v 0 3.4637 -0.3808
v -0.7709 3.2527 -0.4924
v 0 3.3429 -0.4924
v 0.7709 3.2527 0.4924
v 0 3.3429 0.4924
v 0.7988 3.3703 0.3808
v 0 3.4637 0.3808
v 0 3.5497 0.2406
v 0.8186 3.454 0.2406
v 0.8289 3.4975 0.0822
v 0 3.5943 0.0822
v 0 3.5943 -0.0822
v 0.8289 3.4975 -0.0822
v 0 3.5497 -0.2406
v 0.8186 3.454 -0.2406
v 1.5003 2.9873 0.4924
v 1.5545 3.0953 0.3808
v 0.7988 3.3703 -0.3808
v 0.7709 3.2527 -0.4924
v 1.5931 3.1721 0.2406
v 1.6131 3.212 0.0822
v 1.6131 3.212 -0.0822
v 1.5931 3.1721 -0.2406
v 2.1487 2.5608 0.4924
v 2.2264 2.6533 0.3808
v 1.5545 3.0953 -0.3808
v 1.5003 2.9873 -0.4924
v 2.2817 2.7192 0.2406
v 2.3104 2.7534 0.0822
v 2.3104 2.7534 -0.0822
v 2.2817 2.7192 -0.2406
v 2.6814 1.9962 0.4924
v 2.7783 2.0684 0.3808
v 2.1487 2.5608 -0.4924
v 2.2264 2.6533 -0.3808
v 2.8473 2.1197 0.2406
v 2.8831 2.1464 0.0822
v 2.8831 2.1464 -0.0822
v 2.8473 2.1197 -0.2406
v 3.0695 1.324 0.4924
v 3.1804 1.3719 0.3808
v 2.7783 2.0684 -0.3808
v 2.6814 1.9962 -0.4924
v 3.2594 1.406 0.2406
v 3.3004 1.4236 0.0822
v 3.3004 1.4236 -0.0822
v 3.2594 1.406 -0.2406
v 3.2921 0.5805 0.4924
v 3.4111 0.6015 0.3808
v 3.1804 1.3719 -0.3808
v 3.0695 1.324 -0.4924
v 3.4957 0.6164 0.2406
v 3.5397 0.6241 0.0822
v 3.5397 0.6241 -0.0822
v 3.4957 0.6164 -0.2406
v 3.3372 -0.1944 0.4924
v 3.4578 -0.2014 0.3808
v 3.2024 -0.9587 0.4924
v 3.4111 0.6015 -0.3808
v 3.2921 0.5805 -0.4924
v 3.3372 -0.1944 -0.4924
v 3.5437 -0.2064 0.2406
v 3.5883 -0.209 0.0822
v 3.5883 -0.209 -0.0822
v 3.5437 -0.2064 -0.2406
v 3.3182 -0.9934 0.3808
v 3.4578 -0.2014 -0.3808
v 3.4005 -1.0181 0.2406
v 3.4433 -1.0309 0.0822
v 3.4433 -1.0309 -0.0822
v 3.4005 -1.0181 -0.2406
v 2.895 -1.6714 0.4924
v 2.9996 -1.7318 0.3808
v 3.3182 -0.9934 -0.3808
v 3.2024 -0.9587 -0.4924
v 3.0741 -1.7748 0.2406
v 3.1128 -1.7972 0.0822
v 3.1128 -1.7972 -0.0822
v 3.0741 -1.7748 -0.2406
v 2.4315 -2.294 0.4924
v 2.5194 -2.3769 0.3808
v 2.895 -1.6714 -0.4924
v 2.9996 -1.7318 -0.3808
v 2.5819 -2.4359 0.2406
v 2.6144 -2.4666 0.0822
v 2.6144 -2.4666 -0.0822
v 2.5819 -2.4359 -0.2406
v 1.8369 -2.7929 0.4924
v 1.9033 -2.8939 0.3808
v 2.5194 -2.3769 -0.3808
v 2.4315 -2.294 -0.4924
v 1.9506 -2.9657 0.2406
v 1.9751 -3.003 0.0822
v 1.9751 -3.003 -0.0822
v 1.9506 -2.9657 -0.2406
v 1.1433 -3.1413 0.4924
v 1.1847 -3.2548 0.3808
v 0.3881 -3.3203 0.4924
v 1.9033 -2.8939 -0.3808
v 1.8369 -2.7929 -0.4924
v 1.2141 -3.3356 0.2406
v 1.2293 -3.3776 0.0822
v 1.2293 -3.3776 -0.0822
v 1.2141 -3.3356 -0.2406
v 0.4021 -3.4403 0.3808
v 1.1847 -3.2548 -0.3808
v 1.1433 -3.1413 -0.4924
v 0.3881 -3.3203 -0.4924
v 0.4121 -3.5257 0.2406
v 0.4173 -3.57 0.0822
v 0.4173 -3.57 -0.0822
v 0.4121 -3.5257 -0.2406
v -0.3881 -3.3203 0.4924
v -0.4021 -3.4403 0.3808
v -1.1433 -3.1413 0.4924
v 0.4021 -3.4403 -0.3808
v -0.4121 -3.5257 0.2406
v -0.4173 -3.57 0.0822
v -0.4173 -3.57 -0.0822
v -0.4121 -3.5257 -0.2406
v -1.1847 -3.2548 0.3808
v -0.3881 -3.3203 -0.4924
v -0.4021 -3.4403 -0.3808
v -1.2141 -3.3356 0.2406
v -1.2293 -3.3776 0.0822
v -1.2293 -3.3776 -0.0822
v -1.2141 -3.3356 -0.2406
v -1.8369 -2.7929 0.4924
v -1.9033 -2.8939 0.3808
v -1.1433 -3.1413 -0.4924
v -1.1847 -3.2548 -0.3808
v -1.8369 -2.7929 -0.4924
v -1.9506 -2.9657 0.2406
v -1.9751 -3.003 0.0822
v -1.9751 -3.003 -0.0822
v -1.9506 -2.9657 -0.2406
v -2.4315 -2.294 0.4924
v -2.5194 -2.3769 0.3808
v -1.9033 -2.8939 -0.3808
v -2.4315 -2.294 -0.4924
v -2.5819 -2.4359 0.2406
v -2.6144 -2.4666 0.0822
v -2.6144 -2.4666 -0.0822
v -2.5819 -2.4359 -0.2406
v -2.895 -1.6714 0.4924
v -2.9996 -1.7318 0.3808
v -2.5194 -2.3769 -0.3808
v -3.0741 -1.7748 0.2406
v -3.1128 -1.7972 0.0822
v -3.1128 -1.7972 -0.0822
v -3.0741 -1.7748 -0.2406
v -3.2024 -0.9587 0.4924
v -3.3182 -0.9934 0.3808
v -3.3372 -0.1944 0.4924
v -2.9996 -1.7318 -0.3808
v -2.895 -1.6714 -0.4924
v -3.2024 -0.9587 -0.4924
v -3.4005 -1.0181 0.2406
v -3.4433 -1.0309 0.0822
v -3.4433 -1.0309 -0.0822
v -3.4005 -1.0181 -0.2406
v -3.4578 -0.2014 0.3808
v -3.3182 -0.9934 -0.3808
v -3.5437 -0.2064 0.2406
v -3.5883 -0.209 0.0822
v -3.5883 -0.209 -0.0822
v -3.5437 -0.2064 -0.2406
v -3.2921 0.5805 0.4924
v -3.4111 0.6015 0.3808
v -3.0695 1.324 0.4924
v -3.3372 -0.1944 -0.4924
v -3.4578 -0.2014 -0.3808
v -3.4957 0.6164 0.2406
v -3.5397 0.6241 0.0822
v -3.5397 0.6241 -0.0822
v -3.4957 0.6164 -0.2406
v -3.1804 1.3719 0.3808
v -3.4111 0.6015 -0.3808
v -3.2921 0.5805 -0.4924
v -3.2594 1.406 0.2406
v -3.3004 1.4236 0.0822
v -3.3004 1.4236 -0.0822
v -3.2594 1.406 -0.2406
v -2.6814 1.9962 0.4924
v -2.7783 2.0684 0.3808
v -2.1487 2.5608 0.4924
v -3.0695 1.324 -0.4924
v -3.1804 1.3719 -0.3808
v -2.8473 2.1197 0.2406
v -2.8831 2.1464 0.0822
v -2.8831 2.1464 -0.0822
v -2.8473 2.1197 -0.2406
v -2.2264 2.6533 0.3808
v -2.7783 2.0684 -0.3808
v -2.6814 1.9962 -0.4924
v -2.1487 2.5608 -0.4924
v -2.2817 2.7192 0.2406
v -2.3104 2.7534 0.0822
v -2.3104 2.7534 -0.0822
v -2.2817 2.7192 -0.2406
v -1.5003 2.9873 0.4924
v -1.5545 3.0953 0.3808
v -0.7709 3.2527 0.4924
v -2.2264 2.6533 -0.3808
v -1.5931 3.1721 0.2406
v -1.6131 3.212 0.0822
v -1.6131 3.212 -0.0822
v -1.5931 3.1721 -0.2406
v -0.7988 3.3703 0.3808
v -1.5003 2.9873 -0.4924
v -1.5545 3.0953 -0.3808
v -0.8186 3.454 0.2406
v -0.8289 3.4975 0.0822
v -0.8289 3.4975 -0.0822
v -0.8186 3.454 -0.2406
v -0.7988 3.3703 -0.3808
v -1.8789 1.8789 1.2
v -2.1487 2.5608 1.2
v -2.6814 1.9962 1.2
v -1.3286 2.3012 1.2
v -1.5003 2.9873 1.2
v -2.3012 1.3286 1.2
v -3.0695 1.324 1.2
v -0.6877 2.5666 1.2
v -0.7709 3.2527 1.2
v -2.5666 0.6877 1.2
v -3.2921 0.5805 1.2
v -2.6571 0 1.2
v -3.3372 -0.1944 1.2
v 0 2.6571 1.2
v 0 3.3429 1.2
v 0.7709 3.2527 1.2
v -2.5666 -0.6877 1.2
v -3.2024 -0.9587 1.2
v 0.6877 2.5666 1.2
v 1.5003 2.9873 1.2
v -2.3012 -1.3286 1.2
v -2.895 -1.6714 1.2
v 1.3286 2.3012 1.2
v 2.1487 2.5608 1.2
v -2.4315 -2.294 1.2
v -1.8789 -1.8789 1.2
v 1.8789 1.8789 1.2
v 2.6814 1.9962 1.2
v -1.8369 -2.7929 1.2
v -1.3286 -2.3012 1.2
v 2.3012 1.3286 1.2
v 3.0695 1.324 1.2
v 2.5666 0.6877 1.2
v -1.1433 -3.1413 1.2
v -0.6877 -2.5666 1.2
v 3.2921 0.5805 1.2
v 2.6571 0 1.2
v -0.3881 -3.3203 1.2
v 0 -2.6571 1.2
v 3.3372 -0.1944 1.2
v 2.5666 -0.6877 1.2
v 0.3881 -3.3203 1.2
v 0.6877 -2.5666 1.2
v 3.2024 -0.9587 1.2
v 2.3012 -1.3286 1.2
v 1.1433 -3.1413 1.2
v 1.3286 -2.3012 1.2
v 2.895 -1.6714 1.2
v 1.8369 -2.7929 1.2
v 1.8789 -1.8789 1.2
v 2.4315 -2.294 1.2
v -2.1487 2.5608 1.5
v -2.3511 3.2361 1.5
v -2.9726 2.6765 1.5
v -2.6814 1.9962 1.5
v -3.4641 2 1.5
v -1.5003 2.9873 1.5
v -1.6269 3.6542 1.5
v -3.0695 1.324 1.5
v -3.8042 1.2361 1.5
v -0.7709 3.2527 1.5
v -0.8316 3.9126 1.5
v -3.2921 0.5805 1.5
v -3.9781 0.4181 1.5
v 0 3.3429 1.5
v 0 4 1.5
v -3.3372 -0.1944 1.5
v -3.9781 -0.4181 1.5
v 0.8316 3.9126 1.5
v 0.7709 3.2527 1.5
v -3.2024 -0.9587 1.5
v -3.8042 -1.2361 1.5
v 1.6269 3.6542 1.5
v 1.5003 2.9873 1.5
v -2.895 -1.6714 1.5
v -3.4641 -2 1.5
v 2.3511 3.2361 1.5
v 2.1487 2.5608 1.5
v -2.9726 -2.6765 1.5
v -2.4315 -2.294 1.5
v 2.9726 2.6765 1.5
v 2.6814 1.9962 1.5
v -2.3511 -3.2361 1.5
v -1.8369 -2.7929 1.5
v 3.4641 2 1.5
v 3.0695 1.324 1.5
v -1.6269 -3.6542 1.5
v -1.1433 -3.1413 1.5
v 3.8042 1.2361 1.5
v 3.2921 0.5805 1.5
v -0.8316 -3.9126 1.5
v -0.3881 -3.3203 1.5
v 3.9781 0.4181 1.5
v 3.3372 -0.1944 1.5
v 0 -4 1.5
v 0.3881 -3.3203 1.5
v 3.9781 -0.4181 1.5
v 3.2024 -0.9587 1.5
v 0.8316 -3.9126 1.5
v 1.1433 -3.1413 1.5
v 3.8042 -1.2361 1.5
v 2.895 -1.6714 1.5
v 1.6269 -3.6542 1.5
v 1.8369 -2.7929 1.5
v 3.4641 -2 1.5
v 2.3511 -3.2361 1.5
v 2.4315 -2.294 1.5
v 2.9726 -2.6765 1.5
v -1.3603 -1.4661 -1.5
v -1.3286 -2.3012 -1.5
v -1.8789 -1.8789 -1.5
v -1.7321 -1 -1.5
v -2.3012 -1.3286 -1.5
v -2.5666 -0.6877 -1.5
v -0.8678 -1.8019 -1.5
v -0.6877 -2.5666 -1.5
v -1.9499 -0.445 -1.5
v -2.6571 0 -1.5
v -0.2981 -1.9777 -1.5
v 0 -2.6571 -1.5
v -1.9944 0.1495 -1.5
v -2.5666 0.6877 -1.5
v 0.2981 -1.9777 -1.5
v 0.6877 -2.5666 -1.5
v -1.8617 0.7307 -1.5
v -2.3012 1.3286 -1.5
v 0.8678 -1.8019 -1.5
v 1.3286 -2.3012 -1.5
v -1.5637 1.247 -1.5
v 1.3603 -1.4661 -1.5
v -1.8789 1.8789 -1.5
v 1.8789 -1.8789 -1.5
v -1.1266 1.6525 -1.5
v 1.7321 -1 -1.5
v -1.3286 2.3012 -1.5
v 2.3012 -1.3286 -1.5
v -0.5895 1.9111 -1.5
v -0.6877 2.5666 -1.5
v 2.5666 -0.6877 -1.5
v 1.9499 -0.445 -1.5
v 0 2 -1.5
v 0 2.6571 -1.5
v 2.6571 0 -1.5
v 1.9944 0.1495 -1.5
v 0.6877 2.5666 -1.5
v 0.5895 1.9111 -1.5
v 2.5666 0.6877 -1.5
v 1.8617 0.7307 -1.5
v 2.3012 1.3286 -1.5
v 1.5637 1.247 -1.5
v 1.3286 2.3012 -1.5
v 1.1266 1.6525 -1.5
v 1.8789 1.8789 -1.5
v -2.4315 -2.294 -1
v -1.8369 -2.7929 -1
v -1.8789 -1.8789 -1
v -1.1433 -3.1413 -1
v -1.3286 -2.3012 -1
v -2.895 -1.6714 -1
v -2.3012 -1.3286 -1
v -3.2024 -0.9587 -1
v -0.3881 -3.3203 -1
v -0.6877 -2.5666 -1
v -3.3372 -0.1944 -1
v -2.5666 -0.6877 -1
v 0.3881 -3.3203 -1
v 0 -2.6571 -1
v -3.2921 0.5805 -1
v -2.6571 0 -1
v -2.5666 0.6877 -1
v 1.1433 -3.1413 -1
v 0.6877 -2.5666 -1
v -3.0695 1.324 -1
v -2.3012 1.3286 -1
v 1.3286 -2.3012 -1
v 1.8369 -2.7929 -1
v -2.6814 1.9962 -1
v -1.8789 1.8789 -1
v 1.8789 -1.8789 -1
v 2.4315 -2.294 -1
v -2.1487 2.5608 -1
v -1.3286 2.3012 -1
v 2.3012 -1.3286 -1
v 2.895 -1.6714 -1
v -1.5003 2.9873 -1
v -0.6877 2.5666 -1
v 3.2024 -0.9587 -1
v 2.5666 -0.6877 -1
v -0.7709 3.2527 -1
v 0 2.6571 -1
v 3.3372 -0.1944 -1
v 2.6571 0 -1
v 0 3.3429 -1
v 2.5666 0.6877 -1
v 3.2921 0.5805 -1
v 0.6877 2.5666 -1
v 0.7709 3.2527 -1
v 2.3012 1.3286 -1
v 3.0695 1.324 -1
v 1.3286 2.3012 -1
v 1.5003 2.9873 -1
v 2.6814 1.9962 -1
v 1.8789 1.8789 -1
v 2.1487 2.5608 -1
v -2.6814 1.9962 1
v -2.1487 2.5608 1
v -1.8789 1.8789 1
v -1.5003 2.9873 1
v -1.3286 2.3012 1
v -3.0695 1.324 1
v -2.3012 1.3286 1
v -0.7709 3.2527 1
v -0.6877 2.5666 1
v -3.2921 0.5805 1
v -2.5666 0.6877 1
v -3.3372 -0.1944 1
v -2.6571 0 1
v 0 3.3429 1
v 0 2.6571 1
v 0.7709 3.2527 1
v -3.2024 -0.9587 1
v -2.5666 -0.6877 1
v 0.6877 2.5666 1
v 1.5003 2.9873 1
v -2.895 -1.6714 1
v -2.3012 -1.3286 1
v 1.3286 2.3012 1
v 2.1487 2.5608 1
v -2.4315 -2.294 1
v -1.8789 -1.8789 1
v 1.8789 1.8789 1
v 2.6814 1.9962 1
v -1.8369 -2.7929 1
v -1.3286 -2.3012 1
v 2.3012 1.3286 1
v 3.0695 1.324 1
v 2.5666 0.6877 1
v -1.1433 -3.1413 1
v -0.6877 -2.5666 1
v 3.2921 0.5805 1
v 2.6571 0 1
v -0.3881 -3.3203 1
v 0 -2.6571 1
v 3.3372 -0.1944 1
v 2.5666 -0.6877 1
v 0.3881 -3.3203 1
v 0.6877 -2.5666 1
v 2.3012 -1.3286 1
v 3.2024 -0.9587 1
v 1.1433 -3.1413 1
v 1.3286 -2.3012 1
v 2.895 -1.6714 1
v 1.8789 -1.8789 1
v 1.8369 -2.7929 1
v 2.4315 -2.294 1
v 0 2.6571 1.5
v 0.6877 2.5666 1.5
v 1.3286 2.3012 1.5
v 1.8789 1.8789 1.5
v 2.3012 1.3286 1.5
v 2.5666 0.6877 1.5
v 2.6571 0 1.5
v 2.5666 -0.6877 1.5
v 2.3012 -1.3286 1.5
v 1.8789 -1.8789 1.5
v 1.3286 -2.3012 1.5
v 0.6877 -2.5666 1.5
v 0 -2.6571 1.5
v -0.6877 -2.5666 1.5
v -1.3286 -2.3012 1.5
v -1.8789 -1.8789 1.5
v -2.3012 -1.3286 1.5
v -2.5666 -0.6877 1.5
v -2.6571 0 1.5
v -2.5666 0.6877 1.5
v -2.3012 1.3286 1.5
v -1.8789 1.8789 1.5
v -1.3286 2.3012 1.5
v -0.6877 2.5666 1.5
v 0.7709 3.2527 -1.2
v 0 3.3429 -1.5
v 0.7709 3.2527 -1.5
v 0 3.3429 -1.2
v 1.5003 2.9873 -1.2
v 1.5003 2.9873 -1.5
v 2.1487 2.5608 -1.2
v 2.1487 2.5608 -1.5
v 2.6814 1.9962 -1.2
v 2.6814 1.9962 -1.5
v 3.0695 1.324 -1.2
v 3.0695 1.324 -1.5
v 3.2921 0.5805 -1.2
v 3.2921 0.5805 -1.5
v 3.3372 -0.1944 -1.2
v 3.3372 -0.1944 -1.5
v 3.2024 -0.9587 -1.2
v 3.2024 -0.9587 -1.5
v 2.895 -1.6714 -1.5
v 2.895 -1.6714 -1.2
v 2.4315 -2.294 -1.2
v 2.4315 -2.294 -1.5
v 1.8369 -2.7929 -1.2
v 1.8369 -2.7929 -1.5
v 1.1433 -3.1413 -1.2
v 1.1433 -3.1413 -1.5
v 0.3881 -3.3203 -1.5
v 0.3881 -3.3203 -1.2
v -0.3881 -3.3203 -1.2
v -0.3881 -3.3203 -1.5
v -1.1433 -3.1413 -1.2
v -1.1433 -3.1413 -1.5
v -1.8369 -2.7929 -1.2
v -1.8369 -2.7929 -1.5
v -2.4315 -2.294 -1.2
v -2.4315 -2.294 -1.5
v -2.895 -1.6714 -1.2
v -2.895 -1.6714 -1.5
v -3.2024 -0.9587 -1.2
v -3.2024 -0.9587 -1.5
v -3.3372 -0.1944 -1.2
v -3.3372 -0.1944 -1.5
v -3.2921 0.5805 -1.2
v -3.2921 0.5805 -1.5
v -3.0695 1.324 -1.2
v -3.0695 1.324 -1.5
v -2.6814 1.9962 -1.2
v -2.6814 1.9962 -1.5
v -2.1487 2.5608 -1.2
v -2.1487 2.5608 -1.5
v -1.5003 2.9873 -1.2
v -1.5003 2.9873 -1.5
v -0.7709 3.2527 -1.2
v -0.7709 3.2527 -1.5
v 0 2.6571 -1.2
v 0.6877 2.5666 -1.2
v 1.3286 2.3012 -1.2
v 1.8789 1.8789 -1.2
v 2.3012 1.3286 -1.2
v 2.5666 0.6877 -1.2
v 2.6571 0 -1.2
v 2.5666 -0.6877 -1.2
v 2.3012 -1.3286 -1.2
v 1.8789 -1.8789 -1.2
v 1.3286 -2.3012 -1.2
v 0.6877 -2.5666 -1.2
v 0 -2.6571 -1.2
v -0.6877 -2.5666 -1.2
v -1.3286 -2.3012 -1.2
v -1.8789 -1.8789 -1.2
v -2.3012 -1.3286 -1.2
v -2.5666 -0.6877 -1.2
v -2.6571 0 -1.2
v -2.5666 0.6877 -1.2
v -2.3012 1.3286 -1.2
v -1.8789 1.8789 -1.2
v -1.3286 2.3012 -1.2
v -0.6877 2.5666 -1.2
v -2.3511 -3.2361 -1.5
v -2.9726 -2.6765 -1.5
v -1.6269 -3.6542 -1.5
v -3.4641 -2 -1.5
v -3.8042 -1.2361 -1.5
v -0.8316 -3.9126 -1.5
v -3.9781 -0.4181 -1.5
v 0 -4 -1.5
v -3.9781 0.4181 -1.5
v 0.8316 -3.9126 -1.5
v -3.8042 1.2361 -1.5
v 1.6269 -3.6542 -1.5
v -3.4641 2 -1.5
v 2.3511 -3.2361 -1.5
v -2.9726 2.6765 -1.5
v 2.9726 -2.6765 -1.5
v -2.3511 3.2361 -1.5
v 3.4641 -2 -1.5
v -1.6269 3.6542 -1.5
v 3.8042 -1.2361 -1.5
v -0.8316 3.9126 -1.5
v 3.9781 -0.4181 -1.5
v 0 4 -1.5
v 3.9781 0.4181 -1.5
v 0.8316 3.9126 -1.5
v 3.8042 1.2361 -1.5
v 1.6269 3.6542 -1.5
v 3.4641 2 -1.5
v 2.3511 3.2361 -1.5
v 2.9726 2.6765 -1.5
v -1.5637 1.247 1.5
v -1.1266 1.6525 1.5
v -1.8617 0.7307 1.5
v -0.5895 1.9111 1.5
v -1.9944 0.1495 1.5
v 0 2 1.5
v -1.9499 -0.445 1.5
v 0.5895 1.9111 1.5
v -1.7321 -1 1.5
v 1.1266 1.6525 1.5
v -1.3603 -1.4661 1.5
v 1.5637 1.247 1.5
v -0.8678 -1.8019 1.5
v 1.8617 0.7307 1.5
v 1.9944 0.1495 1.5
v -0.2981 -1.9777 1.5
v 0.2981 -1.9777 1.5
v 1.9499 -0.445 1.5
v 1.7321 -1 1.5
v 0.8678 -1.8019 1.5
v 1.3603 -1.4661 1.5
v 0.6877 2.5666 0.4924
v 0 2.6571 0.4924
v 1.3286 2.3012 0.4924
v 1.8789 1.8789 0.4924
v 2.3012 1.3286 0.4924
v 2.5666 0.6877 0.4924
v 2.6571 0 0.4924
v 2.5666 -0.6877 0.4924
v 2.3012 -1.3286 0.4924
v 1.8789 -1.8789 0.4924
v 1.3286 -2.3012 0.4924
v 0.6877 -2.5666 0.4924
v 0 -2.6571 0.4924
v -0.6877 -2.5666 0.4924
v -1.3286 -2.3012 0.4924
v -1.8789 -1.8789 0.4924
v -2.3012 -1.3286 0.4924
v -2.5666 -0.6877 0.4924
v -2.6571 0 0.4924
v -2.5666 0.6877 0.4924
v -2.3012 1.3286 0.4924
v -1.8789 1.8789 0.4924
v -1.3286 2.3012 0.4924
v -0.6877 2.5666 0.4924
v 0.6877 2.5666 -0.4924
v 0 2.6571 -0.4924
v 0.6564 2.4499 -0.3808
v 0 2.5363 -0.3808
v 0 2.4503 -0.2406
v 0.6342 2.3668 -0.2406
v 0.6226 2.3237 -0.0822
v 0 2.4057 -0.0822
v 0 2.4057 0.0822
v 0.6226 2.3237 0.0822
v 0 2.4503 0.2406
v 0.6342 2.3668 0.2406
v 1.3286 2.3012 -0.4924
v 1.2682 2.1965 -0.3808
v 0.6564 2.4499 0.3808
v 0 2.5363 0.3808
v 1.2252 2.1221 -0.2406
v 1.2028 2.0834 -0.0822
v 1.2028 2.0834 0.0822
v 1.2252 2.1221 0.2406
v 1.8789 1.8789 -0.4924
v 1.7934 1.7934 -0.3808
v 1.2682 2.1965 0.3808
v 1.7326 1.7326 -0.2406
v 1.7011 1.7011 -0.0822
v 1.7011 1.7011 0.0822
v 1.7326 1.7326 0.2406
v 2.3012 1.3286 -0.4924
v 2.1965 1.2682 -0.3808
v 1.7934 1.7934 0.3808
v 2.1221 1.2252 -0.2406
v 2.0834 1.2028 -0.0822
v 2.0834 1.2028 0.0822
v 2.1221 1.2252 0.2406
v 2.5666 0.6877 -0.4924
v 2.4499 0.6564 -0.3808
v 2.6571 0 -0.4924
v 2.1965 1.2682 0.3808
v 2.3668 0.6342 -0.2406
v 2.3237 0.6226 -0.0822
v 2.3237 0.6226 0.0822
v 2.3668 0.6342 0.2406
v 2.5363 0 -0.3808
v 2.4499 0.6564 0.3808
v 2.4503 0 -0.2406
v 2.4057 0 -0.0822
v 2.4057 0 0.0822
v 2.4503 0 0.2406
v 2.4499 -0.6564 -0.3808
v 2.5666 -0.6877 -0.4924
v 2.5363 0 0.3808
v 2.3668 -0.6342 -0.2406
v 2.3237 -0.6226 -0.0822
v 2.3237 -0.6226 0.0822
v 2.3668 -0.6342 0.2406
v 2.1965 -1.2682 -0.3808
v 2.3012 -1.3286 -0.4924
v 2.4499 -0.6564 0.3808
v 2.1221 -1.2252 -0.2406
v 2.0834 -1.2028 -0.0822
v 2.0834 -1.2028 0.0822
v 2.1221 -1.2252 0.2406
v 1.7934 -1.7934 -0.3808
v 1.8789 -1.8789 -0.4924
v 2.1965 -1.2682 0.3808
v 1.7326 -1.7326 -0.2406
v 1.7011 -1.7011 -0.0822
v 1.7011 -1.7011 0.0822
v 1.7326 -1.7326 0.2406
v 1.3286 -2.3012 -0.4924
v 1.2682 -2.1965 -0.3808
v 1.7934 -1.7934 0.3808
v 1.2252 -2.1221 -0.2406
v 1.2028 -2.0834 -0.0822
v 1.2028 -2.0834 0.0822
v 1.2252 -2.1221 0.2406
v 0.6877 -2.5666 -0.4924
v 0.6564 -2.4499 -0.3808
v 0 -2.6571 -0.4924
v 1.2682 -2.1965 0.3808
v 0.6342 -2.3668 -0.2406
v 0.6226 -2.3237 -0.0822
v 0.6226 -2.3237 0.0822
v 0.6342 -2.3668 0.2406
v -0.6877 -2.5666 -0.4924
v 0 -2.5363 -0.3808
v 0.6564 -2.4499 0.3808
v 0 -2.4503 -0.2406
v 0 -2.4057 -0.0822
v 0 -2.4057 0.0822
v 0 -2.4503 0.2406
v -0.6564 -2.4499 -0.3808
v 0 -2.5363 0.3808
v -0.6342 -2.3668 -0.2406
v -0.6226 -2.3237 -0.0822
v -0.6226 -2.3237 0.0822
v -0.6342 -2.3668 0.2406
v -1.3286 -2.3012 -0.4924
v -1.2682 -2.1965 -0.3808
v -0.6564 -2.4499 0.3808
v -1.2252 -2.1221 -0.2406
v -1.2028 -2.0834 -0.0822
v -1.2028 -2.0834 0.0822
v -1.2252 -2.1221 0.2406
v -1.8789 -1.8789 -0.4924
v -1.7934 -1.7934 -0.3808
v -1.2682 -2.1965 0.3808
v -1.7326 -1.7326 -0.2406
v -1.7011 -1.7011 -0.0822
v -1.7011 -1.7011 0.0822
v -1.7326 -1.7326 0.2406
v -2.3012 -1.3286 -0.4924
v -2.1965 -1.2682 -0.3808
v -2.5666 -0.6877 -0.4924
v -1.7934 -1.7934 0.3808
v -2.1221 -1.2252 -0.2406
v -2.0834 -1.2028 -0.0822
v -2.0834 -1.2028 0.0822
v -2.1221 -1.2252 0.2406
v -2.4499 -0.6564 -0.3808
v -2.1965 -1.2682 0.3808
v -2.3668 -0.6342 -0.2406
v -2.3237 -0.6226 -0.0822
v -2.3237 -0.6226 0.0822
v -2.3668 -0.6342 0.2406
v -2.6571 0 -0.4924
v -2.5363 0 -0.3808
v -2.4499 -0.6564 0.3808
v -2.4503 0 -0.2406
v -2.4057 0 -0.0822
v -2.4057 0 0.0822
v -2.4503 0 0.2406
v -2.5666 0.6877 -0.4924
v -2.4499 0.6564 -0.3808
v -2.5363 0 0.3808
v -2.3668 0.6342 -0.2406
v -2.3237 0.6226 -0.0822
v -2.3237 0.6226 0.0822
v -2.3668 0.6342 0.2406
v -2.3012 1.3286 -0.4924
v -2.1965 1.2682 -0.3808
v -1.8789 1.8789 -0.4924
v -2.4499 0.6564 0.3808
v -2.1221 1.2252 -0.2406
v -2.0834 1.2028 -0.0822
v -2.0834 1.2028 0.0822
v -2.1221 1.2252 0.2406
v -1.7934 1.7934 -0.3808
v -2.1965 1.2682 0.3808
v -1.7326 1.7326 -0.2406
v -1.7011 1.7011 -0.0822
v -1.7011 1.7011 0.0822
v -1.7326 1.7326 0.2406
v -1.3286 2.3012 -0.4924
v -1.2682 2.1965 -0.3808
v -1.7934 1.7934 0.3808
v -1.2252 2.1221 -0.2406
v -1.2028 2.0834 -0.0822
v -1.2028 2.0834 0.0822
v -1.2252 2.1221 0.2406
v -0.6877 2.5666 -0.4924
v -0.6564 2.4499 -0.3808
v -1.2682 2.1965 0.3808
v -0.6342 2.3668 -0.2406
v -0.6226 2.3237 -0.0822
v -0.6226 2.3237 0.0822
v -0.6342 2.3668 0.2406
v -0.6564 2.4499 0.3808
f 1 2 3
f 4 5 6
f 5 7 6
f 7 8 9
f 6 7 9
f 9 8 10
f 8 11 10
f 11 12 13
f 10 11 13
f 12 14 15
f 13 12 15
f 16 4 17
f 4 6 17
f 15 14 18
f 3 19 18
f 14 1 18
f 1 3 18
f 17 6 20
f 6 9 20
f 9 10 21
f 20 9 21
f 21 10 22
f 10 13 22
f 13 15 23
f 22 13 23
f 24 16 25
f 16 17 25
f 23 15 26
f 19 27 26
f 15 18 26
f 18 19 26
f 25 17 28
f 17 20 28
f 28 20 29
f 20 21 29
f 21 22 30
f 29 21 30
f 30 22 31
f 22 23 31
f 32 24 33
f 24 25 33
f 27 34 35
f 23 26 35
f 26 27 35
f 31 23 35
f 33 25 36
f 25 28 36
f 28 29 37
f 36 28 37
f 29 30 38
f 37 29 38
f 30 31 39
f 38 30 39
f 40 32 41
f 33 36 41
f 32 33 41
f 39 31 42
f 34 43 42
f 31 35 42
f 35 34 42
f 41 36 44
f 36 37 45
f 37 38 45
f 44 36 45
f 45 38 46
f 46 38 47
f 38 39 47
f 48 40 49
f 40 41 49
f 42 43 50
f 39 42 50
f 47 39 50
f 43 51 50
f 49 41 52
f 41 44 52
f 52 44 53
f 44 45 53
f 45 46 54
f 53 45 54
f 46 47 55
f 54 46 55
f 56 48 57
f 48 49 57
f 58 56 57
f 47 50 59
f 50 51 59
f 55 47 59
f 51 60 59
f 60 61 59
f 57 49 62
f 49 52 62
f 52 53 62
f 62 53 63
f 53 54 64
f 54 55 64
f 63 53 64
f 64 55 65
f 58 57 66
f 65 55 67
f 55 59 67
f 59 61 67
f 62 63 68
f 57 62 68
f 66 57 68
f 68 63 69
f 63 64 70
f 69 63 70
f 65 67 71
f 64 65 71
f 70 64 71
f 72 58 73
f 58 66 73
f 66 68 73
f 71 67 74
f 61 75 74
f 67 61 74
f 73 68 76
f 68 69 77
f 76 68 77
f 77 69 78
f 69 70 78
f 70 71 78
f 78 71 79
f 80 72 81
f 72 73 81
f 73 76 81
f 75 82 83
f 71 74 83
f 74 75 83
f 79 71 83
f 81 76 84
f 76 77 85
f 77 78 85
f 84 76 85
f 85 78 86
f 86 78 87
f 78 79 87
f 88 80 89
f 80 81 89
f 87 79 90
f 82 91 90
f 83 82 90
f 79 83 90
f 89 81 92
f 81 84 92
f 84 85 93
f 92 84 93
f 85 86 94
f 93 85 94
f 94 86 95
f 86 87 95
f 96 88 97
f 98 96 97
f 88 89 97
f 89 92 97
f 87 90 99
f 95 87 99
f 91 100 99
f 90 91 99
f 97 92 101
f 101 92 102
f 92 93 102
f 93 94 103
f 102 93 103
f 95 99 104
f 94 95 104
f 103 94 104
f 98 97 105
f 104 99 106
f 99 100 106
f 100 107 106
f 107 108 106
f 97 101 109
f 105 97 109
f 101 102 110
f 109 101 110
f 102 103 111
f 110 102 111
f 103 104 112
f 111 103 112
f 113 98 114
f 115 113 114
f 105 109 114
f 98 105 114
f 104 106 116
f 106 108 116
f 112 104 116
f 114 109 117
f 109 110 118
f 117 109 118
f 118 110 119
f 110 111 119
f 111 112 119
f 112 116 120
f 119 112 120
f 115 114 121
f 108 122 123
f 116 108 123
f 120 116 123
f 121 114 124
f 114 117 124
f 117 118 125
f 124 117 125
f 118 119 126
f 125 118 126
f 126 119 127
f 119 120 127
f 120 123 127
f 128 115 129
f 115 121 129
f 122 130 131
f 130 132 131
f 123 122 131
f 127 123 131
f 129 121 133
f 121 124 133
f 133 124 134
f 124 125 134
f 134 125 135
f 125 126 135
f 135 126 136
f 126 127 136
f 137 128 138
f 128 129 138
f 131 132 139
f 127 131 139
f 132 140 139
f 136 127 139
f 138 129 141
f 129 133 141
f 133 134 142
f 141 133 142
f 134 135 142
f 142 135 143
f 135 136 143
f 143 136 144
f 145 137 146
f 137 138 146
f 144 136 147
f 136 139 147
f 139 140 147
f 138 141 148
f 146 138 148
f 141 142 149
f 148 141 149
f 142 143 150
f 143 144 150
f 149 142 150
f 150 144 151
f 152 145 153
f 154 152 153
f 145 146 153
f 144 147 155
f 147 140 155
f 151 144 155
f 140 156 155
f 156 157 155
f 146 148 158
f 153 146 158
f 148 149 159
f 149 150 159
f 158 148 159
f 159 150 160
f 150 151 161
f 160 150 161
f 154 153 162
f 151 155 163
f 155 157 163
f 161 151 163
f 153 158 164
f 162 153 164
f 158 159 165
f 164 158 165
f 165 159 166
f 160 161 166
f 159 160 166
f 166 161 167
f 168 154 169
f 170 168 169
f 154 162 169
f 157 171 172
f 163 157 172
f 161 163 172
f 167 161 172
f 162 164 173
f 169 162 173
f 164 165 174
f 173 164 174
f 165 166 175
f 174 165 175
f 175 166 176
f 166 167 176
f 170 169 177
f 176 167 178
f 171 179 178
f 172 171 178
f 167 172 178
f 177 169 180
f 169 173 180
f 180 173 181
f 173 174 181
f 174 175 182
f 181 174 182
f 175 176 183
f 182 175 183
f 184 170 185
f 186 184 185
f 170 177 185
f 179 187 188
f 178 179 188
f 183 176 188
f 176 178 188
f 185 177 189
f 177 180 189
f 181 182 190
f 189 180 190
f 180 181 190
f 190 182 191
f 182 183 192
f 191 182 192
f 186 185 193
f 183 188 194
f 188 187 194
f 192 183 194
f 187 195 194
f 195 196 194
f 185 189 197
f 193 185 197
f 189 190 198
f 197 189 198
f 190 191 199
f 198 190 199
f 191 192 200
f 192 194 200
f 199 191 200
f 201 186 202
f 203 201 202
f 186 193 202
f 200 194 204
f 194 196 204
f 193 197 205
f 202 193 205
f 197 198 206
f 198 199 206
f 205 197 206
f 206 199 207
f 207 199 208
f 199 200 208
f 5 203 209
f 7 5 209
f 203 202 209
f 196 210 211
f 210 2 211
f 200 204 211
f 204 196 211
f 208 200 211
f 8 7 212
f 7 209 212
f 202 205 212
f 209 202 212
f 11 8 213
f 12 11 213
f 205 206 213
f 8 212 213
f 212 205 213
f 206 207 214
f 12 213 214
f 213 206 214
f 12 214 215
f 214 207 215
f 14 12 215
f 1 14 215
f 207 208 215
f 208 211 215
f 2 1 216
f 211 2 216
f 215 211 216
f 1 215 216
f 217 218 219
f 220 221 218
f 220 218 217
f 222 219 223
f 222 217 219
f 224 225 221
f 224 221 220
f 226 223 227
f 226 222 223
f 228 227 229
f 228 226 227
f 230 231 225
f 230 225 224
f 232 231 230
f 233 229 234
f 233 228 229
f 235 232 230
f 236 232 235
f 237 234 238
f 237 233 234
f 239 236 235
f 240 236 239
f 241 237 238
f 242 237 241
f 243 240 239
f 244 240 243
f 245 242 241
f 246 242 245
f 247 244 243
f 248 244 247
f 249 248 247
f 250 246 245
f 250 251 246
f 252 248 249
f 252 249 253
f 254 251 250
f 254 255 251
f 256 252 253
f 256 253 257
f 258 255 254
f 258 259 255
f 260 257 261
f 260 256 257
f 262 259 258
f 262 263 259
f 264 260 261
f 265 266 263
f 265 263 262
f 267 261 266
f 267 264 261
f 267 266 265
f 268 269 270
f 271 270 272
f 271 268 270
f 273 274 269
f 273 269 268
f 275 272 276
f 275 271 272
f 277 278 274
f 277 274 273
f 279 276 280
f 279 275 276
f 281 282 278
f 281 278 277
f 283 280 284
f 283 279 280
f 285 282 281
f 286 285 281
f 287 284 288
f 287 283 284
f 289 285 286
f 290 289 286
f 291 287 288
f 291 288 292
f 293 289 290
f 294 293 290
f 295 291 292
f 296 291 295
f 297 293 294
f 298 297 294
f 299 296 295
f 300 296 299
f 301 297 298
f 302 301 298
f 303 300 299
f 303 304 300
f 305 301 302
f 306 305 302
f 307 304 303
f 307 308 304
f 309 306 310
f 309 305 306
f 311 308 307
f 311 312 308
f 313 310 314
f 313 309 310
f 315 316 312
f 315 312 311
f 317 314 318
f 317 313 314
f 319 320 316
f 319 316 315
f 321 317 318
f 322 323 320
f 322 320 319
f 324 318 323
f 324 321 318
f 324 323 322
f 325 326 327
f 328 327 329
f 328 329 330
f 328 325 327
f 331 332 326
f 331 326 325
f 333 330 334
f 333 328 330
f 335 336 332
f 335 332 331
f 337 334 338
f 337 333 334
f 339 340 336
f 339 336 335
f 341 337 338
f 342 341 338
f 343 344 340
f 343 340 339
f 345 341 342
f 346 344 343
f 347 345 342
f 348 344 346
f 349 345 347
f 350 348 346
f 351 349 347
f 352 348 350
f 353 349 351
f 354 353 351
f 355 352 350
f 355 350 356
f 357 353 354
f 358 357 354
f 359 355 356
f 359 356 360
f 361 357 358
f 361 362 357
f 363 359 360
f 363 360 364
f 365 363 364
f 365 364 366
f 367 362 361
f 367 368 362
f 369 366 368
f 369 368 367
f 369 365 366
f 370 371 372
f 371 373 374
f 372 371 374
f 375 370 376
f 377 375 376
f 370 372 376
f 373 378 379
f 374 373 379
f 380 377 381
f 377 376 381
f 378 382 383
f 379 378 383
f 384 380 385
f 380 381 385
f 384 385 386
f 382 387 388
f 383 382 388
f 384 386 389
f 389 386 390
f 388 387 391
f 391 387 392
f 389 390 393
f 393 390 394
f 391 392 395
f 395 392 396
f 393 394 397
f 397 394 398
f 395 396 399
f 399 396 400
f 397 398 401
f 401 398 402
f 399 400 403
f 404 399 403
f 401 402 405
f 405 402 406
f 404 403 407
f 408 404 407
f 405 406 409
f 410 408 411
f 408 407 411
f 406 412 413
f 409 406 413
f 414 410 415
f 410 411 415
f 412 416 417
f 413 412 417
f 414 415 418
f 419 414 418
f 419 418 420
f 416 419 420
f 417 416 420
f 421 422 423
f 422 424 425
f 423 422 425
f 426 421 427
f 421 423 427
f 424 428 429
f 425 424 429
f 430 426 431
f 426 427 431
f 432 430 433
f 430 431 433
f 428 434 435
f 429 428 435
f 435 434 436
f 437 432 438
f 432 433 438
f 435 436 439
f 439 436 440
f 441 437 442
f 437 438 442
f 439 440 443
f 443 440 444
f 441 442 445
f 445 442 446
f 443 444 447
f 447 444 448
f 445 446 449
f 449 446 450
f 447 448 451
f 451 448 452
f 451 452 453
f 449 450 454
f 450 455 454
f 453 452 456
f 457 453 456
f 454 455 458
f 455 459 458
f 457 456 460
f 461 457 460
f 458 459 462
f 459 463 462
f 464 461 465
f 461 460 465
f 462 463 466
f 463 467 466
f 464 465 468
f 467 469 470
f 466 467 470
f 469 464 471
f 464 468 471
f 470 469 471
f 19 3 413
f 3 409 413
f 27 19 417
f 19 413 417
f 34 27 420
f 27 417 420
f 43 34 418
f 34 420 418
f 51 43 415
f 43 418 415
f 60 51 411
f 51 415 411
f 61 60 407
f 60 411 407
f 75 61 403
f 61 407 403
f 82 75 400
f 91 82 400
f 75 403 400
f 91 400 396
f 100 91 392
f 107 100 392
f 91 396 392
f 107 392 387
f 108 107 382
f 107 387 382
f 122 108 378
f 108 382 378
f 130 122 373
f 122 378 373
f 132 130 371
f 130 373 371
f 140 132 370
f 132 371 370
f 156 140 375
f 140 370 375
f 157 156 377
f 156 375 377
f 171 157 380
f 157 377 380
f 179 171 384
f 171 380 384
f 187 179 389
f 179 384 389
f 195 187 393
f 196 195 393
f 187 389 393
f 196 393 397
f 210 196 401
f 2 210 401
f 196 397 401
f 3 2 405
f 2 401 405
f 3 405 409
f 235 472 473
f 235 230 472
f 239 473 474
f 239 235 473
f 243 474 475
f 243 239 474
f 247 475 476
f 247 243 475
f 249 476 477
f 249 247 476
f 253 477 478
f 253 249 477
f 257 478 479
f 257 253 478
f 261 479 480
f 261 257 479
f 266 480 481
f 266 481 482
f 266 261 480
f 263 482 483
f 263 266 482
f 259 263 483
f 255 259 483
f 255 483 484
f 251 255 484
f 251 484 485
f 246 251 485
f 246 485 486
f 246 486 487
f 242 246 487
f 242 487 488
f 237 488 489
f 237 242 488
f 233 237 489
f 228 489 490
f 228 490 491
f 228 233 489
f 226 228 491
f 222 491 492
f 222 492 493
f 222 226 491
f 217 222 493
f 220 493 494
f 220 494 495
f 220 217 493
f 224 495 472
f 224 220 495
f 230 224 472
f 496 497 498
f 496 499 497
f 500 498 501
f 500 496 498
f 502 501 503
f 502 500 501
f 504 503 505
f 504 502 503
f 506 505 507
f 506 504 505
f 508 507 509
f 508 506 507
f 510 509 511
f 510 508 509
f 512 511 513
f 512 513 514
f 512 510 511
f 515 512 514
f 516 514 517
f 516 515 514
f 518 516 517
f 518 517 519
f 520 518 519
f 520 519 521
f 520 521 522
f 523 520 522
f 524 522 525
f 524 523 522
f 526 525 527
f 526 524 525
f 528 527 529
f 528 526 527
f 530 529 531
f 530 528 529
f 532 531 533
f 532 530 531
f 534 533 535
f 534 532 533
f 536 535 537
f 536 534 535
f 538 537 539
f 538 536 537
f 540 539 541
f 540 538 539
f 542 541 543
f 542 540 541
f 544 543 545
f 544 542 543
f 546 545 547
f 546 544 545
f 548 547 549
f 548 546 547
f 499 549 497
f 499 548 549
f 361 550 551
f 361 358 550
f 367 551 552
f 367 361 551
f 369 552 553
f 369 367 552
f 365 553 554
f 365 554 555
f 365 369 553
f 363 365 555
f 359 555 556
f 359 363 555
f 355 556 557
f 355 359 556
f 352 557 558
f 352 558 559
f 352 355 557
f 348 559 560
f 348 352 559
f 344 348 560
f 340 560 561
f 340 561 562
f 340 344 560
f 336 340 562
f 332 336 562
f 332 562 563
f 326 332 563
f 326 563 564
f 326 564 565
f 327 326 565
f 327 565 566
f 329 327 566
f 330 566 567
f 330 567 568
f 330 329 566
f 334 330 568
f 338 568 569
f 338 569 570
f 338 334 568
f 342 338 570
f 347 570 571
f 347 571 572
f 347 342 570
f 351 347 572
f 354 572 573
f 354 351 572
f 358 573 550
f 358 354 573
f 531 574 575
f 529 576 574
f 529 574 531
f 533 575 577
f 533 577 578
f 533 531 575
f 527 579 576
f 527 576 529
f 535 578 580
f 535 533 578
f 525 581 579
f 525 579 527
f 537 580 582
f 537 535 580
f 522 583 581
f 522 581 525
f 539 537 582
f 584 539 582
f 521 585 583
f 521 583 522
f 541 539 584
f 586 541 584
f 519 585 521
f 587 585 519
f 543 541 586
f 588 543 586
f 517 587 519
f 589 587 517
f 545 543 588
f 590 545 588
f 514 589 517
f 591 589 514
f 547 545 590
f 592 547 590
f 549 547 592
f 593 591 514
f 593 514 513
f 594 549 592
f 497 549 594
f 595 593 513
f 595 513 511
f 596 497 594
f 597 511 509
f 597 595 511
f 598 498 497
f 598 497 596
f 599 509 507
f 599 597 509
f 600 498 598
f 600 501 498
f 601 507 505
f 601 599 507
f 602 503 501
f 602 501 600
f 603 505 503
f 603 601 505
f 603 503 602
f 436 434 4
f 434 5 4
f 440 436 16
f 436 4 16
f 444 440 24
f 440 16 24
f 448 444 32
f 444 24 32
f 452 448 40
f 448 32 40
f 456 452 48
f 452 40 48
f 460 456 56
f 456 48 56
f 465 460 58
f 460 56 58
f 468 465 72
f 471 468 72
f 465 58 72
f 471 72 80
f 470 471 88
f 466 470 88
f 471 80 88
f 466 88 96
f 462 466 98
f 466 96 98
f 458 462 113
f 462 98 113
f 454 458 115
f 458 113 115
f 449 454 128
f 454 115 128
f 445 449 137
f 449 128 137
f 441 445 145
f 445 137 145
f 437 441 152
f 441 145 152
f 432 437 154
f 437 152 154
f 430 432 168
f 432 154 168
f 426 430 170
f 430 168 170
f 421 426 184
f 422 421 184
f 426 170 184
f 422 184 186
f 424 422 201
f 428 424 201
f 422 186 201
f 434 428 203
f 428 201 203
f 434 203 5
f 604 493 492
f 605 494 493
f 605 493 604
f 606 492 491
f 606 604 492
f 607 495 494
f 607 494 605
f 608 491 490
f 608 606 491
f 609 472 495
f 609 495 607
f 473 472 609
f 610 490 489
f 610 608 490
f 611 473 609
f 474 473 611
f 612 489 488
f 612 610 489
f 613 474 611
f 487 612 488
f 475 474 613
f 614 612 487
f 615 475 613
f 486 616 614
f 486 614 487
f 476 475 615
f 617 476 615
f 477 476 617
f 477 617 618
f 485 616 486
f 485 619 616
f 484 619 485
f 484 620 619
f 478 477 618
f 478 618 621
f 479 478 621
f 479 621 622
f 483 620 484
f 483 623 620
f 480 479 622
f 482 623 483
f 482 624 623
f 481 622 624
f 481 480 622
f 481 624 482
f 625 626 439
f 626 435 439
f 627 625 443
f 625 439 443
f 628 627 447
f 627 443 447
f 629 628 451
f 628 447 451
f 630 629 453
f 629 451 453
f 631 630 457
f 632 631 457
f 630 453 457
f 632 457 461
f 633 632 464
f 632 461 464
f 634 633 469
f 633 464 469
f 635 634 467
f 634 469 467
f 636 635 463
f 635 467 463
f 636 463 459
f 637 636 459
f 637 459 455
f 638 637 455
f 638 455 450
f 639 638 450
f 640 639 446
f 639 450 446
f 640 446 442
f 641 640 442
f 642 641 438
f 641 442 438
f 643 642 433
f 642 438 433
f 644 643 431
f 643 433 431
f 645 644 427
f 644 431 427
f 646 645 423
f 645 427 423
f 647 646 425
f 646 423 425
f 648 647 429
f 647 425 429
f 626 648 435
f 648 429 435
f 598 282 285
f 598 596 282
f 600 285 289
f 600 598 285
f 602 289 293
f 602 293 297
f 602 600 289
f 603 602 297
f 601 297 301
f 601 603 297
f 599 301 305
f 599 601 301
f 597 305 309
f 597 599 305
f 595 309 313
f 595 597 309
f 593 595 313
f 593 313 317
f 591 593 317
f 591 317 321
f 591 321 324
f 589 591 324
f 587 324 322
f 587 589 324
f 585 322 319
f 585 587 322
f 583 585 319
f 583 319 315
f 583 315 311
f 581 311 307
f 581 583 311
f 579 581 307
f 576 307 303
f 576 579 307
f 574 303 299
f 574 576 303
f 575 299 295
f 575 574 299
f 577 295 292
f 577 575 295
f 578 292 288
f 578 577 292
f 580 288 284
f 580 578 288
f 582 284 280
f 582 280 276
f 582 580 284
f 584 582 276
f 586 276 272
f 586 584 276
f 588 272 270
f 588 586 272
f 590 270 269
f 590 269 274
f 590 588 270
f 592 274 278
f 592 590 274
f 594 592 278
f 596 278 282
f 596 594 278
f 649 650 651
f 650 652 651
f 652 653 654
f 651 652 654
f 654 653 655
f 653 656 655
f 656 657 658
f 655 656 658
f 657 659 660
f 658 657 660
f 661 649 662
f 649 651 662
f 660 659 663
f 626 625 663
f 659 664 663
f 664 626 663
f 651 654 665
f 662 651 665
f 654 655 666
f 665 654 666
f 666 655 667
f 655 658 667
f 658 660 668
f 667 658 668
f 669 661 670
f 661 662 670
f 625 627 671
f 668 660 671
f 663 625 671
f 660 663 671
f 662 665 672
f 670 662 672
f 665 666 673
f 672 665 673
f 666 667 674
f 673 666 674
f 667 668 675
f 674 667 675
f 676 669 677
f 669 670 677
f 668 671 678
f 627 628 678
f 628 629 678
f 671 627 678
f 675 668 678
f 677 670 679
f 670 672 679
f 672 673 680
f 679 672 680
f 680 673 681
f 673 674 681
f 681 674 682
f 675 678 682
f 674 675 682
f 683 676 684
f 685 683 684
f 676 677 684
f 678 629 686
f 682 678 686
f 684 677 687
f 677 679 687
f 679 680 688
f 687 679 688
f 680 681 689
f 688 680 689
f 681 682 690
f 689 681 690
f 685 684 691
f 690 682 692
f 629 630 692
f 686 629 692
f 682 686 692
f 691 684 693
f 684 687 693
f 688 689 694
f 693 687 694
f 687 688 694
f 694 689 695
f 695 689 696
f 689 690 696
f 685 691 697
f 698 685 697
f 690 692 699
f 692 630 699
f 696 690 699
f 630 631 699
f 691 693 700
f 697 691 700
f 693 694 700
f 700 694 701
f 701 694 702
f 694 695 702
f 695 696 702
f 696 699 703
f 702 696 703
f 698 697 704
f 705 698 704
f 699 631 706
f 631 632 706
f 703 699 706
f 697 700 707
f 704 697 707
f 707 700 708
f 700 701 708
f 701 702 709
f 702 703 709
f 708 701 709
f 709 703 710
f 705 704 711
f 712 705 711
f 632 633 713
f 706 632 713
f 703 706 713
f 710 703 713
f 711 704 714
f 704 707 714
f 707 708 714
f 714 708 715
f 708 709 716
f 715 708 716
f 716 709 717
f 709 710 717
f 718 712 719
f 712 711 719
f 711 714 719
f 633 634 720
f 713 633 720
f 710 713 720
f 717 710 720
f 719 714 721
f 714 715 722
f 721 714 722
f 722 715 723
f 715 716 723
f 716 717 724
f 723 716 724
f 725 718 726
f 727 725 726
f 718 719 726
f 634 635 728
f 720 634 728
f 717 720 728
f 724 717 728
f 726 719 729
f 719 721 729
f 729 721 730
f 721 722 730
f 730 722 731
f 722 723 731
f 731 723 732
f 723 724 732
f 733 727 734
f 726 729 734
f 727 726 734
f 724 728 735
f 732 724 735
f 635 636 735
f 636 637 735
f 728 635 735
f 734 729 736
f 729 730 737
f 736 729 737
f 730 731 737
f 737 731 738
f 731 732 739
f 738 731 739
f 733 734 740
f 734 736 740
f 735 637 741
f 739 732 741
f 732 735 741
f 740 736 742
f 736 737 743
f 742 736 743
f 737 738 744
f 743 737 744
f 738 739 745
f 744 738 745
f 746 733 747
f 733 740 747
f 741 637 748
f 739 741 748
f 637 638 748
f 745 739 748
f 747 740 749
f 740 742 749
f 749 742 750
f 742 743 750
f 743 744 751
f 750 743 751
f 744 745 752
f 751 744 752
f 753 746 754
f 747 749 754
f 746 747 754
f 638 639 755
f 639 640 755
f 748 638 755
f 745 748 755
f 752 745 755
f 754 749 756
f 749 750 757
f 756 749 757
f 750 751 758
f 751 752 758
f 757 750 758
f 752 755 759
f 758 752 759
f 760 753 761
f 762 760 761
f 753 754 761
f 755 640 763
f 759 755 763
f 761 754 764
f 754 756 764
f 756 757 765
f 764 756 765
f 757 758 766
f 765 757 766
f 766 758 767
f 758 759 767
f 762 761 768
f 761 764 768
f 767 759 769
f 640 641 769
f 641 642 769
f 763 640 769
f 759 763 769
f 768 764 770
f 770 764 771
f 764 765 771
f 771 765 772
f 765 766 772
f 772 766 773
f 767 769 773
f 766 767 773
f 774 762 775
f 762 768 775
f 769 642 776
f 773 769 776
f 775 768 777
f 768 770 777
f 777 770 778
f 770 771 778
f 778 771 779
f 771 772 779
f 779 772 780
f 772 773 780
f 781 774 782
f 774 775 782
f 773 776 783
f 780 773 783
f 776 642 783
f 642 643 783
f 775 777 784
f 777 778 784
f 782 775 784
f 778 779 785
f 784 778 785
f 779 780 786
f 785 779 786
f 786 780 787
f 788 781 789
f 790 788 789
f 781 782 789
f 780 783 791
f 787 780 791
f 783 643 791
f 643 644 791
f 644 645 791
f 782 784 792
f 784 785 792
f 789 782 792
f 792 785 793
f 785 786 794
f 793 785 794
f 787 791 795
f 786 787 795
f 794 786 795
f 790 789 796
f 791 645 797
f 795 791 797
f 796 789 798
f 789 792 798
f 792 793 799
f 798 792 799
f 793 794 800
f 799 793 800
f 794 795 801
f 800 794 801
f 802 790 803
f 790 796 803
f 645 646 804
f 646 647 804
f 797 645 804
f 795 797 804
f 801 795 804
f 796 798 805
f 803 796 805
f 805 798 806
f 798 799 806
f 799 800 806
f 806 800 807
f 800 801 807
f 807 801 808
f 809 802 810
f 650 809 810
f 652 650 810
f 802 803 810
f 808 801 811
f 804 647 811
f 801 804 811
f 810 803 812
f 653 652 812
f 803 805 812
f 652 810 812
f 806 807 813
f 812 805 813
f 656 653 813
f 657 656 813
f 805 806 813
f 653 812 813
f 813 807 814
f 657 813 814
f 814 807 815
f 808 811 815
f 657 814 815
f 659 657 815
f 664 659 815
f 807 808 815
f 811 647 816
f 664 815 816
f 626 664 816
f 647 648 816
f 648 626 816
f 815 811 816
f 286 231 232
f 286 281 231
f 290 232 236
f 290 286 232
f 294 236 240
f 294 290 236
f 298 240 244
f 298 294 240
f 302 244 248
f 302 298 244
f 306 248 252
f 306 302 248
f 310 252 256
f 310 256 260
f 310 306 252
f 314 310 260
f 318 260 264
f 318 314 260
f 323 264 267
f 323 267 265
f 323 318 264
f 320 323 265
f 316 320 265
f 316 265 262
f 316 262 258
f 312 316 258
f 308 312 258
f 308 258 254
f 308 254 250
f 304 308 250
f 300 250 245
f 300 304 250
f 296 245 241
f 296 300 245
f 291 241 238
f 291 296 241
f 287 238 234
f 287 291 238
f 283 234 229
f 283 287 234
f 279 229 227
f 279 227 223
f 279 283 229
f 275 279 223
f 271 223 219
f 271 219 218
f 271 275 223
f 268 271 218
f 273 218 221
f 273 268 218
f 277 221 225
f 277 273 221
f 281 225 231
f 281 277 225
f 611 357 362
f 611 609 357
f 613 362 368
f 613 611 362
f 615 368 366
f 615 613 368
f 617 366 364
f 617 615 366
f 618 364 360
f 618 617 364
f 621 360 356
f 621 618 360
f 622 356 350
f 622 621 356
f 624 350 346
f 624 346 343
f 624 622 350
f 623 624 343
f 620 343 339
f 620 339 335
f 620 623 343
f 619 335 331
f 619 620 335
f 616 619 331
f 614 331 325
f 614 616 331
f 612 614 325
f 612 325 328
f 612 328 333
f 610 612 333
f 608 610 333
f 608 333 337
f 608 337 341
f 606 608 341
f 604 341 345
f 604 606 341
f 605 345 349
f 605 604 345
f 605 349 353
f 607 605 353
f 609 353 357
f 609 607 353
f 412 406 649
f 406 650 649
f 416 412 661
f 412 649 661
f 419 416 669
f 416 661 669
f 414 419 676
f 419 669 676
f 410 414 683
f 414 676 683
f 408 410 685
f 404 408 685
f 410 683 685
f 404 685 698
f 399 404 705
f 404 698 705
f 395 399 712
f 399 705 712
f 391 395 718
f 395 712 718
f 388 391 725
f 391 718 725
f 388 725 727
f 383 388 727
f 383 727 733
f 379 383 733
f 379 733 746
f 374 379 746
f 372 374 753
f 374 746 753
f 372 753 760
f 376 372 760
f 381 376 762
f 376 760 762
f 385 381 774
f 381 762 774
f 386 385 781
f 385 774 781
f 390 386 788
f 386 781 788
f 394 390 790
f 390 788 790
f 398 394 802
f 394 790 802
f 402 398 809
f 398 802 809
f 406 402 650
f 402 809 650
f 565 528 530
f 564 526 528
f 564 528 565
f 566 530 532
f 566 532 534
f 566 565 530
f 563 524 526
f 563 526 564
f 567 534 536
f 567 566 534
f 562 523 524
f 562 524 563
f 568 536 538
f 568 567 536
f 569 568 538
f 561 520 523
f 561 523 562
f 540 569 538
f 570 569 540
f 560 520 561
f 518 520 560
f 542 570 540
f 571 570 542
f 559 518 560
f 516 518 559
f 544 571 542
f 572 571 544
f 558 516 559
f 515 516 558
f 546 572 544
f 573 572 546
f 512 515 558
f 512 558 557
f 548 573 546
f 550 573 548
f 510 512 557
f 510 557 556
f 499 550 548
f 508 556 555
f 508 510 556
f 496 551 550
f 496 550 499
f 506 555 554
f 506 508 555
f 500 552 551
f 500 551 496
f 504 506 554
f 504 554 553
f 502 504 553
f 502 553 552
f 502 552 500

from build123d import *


with BuildPart() as part:
    # Эскиз1 → Повернуть1 (revolve)
    with BuildSketch(Plane(origin=(0, 0, 0), x_dir=(0, 0, -1), z_dir=(1, 0, 0))):
        Polygon((1.5, 2), (-1.5, 2), (-1.5, 2.657142857), (-1.2, 2.657142857), (-1.2, 3.342857143), (-1.5, 3.342857143), (-1.5, 4), (1.5, 4), (1.5, 3.342857143), (1.2, 3.342857143), (1.2, 2.657142857), (1.5, 2.657142857), align=None)
        with BuildLine():
            Line((0.492391084, 3.342857143), (1, 3.342857143))
            Line((1, 3.342857143), (1, 2.657142857))
            Line((1, 2.657142857), (0.492391084, 2.657142857))
            ThreePointArc((0.492391084, 2.657142857), (0, 2.4), (-0.492391084, 2.657142857))
            Line((-0.492391084, 2.657142857), (-1, 2.657142857))
            Line((-1, 2.657142857), (-1, 3.342857143))
            Line((-1, 3.342857143), (-0.492391084, 3.342857143))
            ThreePointArc((-0.492391084, 3.342857143), (0, 3.6), (0.492391084, 3.342857143))
        make_face(mode=Mode.SUBTRACT)
    revolve(axis=Axis((0, 0, 0), (0, 0, -1)))


solid = part.part
